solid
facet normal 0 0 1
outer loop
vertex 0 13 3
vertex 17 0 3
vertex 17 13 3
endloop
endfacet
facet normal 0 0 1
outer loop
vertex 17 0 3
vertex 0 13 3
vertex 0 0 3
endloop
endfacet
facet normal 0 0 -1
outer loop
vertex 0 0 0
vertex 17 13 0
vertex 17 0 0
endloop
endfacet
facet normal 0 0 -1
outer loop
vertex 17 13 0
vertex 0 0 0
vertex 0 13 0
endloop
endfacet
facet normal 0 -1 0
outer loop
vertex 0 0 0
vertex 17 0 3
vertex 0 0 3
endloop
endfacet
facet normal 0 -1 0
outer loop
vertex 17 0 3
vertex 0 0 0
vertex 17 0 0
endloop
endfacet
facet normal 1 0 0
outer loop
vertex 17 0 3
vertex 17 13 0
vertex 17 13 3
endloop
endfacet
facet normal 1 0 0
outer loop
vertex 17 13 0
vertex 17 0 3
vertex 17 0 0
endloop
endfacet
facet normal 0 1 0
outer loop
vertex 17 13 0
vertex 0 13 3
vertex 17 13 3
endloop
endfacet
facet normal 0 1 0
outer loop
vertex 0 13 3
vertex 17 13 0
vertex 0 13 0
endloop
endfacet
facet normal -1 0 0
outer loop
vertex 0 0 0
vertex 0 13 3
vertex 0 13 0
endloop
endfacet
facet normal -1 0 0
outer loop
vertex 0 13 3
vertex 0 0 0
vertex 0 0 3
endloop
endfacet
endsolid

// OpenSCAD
// Generated by SolidPython 1.0.1 on 2020-07-29 00:46:56


cube(size = [17, 13, 3]);
/***********************************************
*********      SolidPython code:      **********
************************************************
 
# import packages: SolidPython
from solid import *
from solid.utils import *
from itertools import chain, combinations, permutations


class Resize:

    def __init__(self, scad_file):
        self.scad_file = scad_file
        #self.scad_file = import_scad(scad_file)
        # cone/cylinder param:
        self.r1 = 0
        self.r2 = 0
        self.h = 0
        # rectangular prism param:
        self.w = 0
        self.l = 0
        # ellipse param:
        self.r = 0

    # import OpenScad code (file name corresponds to shape)


    # classify shape + parameters
    def assign(self, param1, param2, param3):
        if self.scad_file == 'cone.scad':
            self.r1 = param1
            self.r2 = param2
            self.h = param3
        elif self.scad_file == 'cylinder.scad':
            self.r1 = param1
            self.r2 = param2
            self.h = param3
        elif self.scad_file == 'rectangularPrism.scad':
            self.h = param1
            self.l = param2
            self.w = param3
        else:
            self.r = param1
            self.h = param2

    # resize parameters
    def iterate(self):
        x = range(3, 20, 2)
        i = 1
        if self.scad_file == 'cone.scad':
            tempList = list(permutations(x, 2))
            for temp in tempList:
                param1 = temp[0]
                param2 = temp[1]
                filepath = 'produced_scad_files/' + 'cone' + str(param1) + '_' + str(param2) + '_' + '.scad'
                scad_render_to_file(cylinder(h=param1, r1=param2, r2=0), filepath)

        elif self.scad_file == 'cylinder.scad':
            tempList = list(permutations(x, 3))
            for temp in tempList:
                param1 = temp[0]
                param2 = temp[1]
                filepath = 'produced_scad_files/' + 'cylinder' + str(param1) + '_' + str(param2) + '_' + '.scad'
                scad_render_to_file(cylinder(h=param1, r1=param2, r2=param2), filepath)

        elif self.scad_file == 'rectangularPrism.scad':
            tempList = list(permutations(x, 3))
            for temp in tempList:
                param1 = temp[0]
                param2 = temp[1]
                param3 = temp[2]
                filepath = 'produced_scad_files/' + 'rectangularPrism' + str(param1) + '_' + str(param2) + '_' + str(
                    param3) + '.scad'
                scad_render_to_file(cube(size=(param1, param2, param3)), filepath)

        elif self.scad_file == 'ellipse.scad':
            tempList = list(permutations(x, 4))
            for temp in tempList:
                param1 = temp[0]
                param2 = temp[1]
                param3 = temp[2]
                param4 = temp[3]
                filepath = 'produced_scad_files/' + 'ellipse' + str(param1) + '_' + str(param2) + '_' + str(param3) + '_' + str(param4) + '.scad'
                scad_render_to_file(scale([param1, param2, param3])(sphere(r=param4)), filepath)

    def render_to_scadfile(self):
        scad_render_to_file(scad, 'example.scad') 
 
************************************************/
